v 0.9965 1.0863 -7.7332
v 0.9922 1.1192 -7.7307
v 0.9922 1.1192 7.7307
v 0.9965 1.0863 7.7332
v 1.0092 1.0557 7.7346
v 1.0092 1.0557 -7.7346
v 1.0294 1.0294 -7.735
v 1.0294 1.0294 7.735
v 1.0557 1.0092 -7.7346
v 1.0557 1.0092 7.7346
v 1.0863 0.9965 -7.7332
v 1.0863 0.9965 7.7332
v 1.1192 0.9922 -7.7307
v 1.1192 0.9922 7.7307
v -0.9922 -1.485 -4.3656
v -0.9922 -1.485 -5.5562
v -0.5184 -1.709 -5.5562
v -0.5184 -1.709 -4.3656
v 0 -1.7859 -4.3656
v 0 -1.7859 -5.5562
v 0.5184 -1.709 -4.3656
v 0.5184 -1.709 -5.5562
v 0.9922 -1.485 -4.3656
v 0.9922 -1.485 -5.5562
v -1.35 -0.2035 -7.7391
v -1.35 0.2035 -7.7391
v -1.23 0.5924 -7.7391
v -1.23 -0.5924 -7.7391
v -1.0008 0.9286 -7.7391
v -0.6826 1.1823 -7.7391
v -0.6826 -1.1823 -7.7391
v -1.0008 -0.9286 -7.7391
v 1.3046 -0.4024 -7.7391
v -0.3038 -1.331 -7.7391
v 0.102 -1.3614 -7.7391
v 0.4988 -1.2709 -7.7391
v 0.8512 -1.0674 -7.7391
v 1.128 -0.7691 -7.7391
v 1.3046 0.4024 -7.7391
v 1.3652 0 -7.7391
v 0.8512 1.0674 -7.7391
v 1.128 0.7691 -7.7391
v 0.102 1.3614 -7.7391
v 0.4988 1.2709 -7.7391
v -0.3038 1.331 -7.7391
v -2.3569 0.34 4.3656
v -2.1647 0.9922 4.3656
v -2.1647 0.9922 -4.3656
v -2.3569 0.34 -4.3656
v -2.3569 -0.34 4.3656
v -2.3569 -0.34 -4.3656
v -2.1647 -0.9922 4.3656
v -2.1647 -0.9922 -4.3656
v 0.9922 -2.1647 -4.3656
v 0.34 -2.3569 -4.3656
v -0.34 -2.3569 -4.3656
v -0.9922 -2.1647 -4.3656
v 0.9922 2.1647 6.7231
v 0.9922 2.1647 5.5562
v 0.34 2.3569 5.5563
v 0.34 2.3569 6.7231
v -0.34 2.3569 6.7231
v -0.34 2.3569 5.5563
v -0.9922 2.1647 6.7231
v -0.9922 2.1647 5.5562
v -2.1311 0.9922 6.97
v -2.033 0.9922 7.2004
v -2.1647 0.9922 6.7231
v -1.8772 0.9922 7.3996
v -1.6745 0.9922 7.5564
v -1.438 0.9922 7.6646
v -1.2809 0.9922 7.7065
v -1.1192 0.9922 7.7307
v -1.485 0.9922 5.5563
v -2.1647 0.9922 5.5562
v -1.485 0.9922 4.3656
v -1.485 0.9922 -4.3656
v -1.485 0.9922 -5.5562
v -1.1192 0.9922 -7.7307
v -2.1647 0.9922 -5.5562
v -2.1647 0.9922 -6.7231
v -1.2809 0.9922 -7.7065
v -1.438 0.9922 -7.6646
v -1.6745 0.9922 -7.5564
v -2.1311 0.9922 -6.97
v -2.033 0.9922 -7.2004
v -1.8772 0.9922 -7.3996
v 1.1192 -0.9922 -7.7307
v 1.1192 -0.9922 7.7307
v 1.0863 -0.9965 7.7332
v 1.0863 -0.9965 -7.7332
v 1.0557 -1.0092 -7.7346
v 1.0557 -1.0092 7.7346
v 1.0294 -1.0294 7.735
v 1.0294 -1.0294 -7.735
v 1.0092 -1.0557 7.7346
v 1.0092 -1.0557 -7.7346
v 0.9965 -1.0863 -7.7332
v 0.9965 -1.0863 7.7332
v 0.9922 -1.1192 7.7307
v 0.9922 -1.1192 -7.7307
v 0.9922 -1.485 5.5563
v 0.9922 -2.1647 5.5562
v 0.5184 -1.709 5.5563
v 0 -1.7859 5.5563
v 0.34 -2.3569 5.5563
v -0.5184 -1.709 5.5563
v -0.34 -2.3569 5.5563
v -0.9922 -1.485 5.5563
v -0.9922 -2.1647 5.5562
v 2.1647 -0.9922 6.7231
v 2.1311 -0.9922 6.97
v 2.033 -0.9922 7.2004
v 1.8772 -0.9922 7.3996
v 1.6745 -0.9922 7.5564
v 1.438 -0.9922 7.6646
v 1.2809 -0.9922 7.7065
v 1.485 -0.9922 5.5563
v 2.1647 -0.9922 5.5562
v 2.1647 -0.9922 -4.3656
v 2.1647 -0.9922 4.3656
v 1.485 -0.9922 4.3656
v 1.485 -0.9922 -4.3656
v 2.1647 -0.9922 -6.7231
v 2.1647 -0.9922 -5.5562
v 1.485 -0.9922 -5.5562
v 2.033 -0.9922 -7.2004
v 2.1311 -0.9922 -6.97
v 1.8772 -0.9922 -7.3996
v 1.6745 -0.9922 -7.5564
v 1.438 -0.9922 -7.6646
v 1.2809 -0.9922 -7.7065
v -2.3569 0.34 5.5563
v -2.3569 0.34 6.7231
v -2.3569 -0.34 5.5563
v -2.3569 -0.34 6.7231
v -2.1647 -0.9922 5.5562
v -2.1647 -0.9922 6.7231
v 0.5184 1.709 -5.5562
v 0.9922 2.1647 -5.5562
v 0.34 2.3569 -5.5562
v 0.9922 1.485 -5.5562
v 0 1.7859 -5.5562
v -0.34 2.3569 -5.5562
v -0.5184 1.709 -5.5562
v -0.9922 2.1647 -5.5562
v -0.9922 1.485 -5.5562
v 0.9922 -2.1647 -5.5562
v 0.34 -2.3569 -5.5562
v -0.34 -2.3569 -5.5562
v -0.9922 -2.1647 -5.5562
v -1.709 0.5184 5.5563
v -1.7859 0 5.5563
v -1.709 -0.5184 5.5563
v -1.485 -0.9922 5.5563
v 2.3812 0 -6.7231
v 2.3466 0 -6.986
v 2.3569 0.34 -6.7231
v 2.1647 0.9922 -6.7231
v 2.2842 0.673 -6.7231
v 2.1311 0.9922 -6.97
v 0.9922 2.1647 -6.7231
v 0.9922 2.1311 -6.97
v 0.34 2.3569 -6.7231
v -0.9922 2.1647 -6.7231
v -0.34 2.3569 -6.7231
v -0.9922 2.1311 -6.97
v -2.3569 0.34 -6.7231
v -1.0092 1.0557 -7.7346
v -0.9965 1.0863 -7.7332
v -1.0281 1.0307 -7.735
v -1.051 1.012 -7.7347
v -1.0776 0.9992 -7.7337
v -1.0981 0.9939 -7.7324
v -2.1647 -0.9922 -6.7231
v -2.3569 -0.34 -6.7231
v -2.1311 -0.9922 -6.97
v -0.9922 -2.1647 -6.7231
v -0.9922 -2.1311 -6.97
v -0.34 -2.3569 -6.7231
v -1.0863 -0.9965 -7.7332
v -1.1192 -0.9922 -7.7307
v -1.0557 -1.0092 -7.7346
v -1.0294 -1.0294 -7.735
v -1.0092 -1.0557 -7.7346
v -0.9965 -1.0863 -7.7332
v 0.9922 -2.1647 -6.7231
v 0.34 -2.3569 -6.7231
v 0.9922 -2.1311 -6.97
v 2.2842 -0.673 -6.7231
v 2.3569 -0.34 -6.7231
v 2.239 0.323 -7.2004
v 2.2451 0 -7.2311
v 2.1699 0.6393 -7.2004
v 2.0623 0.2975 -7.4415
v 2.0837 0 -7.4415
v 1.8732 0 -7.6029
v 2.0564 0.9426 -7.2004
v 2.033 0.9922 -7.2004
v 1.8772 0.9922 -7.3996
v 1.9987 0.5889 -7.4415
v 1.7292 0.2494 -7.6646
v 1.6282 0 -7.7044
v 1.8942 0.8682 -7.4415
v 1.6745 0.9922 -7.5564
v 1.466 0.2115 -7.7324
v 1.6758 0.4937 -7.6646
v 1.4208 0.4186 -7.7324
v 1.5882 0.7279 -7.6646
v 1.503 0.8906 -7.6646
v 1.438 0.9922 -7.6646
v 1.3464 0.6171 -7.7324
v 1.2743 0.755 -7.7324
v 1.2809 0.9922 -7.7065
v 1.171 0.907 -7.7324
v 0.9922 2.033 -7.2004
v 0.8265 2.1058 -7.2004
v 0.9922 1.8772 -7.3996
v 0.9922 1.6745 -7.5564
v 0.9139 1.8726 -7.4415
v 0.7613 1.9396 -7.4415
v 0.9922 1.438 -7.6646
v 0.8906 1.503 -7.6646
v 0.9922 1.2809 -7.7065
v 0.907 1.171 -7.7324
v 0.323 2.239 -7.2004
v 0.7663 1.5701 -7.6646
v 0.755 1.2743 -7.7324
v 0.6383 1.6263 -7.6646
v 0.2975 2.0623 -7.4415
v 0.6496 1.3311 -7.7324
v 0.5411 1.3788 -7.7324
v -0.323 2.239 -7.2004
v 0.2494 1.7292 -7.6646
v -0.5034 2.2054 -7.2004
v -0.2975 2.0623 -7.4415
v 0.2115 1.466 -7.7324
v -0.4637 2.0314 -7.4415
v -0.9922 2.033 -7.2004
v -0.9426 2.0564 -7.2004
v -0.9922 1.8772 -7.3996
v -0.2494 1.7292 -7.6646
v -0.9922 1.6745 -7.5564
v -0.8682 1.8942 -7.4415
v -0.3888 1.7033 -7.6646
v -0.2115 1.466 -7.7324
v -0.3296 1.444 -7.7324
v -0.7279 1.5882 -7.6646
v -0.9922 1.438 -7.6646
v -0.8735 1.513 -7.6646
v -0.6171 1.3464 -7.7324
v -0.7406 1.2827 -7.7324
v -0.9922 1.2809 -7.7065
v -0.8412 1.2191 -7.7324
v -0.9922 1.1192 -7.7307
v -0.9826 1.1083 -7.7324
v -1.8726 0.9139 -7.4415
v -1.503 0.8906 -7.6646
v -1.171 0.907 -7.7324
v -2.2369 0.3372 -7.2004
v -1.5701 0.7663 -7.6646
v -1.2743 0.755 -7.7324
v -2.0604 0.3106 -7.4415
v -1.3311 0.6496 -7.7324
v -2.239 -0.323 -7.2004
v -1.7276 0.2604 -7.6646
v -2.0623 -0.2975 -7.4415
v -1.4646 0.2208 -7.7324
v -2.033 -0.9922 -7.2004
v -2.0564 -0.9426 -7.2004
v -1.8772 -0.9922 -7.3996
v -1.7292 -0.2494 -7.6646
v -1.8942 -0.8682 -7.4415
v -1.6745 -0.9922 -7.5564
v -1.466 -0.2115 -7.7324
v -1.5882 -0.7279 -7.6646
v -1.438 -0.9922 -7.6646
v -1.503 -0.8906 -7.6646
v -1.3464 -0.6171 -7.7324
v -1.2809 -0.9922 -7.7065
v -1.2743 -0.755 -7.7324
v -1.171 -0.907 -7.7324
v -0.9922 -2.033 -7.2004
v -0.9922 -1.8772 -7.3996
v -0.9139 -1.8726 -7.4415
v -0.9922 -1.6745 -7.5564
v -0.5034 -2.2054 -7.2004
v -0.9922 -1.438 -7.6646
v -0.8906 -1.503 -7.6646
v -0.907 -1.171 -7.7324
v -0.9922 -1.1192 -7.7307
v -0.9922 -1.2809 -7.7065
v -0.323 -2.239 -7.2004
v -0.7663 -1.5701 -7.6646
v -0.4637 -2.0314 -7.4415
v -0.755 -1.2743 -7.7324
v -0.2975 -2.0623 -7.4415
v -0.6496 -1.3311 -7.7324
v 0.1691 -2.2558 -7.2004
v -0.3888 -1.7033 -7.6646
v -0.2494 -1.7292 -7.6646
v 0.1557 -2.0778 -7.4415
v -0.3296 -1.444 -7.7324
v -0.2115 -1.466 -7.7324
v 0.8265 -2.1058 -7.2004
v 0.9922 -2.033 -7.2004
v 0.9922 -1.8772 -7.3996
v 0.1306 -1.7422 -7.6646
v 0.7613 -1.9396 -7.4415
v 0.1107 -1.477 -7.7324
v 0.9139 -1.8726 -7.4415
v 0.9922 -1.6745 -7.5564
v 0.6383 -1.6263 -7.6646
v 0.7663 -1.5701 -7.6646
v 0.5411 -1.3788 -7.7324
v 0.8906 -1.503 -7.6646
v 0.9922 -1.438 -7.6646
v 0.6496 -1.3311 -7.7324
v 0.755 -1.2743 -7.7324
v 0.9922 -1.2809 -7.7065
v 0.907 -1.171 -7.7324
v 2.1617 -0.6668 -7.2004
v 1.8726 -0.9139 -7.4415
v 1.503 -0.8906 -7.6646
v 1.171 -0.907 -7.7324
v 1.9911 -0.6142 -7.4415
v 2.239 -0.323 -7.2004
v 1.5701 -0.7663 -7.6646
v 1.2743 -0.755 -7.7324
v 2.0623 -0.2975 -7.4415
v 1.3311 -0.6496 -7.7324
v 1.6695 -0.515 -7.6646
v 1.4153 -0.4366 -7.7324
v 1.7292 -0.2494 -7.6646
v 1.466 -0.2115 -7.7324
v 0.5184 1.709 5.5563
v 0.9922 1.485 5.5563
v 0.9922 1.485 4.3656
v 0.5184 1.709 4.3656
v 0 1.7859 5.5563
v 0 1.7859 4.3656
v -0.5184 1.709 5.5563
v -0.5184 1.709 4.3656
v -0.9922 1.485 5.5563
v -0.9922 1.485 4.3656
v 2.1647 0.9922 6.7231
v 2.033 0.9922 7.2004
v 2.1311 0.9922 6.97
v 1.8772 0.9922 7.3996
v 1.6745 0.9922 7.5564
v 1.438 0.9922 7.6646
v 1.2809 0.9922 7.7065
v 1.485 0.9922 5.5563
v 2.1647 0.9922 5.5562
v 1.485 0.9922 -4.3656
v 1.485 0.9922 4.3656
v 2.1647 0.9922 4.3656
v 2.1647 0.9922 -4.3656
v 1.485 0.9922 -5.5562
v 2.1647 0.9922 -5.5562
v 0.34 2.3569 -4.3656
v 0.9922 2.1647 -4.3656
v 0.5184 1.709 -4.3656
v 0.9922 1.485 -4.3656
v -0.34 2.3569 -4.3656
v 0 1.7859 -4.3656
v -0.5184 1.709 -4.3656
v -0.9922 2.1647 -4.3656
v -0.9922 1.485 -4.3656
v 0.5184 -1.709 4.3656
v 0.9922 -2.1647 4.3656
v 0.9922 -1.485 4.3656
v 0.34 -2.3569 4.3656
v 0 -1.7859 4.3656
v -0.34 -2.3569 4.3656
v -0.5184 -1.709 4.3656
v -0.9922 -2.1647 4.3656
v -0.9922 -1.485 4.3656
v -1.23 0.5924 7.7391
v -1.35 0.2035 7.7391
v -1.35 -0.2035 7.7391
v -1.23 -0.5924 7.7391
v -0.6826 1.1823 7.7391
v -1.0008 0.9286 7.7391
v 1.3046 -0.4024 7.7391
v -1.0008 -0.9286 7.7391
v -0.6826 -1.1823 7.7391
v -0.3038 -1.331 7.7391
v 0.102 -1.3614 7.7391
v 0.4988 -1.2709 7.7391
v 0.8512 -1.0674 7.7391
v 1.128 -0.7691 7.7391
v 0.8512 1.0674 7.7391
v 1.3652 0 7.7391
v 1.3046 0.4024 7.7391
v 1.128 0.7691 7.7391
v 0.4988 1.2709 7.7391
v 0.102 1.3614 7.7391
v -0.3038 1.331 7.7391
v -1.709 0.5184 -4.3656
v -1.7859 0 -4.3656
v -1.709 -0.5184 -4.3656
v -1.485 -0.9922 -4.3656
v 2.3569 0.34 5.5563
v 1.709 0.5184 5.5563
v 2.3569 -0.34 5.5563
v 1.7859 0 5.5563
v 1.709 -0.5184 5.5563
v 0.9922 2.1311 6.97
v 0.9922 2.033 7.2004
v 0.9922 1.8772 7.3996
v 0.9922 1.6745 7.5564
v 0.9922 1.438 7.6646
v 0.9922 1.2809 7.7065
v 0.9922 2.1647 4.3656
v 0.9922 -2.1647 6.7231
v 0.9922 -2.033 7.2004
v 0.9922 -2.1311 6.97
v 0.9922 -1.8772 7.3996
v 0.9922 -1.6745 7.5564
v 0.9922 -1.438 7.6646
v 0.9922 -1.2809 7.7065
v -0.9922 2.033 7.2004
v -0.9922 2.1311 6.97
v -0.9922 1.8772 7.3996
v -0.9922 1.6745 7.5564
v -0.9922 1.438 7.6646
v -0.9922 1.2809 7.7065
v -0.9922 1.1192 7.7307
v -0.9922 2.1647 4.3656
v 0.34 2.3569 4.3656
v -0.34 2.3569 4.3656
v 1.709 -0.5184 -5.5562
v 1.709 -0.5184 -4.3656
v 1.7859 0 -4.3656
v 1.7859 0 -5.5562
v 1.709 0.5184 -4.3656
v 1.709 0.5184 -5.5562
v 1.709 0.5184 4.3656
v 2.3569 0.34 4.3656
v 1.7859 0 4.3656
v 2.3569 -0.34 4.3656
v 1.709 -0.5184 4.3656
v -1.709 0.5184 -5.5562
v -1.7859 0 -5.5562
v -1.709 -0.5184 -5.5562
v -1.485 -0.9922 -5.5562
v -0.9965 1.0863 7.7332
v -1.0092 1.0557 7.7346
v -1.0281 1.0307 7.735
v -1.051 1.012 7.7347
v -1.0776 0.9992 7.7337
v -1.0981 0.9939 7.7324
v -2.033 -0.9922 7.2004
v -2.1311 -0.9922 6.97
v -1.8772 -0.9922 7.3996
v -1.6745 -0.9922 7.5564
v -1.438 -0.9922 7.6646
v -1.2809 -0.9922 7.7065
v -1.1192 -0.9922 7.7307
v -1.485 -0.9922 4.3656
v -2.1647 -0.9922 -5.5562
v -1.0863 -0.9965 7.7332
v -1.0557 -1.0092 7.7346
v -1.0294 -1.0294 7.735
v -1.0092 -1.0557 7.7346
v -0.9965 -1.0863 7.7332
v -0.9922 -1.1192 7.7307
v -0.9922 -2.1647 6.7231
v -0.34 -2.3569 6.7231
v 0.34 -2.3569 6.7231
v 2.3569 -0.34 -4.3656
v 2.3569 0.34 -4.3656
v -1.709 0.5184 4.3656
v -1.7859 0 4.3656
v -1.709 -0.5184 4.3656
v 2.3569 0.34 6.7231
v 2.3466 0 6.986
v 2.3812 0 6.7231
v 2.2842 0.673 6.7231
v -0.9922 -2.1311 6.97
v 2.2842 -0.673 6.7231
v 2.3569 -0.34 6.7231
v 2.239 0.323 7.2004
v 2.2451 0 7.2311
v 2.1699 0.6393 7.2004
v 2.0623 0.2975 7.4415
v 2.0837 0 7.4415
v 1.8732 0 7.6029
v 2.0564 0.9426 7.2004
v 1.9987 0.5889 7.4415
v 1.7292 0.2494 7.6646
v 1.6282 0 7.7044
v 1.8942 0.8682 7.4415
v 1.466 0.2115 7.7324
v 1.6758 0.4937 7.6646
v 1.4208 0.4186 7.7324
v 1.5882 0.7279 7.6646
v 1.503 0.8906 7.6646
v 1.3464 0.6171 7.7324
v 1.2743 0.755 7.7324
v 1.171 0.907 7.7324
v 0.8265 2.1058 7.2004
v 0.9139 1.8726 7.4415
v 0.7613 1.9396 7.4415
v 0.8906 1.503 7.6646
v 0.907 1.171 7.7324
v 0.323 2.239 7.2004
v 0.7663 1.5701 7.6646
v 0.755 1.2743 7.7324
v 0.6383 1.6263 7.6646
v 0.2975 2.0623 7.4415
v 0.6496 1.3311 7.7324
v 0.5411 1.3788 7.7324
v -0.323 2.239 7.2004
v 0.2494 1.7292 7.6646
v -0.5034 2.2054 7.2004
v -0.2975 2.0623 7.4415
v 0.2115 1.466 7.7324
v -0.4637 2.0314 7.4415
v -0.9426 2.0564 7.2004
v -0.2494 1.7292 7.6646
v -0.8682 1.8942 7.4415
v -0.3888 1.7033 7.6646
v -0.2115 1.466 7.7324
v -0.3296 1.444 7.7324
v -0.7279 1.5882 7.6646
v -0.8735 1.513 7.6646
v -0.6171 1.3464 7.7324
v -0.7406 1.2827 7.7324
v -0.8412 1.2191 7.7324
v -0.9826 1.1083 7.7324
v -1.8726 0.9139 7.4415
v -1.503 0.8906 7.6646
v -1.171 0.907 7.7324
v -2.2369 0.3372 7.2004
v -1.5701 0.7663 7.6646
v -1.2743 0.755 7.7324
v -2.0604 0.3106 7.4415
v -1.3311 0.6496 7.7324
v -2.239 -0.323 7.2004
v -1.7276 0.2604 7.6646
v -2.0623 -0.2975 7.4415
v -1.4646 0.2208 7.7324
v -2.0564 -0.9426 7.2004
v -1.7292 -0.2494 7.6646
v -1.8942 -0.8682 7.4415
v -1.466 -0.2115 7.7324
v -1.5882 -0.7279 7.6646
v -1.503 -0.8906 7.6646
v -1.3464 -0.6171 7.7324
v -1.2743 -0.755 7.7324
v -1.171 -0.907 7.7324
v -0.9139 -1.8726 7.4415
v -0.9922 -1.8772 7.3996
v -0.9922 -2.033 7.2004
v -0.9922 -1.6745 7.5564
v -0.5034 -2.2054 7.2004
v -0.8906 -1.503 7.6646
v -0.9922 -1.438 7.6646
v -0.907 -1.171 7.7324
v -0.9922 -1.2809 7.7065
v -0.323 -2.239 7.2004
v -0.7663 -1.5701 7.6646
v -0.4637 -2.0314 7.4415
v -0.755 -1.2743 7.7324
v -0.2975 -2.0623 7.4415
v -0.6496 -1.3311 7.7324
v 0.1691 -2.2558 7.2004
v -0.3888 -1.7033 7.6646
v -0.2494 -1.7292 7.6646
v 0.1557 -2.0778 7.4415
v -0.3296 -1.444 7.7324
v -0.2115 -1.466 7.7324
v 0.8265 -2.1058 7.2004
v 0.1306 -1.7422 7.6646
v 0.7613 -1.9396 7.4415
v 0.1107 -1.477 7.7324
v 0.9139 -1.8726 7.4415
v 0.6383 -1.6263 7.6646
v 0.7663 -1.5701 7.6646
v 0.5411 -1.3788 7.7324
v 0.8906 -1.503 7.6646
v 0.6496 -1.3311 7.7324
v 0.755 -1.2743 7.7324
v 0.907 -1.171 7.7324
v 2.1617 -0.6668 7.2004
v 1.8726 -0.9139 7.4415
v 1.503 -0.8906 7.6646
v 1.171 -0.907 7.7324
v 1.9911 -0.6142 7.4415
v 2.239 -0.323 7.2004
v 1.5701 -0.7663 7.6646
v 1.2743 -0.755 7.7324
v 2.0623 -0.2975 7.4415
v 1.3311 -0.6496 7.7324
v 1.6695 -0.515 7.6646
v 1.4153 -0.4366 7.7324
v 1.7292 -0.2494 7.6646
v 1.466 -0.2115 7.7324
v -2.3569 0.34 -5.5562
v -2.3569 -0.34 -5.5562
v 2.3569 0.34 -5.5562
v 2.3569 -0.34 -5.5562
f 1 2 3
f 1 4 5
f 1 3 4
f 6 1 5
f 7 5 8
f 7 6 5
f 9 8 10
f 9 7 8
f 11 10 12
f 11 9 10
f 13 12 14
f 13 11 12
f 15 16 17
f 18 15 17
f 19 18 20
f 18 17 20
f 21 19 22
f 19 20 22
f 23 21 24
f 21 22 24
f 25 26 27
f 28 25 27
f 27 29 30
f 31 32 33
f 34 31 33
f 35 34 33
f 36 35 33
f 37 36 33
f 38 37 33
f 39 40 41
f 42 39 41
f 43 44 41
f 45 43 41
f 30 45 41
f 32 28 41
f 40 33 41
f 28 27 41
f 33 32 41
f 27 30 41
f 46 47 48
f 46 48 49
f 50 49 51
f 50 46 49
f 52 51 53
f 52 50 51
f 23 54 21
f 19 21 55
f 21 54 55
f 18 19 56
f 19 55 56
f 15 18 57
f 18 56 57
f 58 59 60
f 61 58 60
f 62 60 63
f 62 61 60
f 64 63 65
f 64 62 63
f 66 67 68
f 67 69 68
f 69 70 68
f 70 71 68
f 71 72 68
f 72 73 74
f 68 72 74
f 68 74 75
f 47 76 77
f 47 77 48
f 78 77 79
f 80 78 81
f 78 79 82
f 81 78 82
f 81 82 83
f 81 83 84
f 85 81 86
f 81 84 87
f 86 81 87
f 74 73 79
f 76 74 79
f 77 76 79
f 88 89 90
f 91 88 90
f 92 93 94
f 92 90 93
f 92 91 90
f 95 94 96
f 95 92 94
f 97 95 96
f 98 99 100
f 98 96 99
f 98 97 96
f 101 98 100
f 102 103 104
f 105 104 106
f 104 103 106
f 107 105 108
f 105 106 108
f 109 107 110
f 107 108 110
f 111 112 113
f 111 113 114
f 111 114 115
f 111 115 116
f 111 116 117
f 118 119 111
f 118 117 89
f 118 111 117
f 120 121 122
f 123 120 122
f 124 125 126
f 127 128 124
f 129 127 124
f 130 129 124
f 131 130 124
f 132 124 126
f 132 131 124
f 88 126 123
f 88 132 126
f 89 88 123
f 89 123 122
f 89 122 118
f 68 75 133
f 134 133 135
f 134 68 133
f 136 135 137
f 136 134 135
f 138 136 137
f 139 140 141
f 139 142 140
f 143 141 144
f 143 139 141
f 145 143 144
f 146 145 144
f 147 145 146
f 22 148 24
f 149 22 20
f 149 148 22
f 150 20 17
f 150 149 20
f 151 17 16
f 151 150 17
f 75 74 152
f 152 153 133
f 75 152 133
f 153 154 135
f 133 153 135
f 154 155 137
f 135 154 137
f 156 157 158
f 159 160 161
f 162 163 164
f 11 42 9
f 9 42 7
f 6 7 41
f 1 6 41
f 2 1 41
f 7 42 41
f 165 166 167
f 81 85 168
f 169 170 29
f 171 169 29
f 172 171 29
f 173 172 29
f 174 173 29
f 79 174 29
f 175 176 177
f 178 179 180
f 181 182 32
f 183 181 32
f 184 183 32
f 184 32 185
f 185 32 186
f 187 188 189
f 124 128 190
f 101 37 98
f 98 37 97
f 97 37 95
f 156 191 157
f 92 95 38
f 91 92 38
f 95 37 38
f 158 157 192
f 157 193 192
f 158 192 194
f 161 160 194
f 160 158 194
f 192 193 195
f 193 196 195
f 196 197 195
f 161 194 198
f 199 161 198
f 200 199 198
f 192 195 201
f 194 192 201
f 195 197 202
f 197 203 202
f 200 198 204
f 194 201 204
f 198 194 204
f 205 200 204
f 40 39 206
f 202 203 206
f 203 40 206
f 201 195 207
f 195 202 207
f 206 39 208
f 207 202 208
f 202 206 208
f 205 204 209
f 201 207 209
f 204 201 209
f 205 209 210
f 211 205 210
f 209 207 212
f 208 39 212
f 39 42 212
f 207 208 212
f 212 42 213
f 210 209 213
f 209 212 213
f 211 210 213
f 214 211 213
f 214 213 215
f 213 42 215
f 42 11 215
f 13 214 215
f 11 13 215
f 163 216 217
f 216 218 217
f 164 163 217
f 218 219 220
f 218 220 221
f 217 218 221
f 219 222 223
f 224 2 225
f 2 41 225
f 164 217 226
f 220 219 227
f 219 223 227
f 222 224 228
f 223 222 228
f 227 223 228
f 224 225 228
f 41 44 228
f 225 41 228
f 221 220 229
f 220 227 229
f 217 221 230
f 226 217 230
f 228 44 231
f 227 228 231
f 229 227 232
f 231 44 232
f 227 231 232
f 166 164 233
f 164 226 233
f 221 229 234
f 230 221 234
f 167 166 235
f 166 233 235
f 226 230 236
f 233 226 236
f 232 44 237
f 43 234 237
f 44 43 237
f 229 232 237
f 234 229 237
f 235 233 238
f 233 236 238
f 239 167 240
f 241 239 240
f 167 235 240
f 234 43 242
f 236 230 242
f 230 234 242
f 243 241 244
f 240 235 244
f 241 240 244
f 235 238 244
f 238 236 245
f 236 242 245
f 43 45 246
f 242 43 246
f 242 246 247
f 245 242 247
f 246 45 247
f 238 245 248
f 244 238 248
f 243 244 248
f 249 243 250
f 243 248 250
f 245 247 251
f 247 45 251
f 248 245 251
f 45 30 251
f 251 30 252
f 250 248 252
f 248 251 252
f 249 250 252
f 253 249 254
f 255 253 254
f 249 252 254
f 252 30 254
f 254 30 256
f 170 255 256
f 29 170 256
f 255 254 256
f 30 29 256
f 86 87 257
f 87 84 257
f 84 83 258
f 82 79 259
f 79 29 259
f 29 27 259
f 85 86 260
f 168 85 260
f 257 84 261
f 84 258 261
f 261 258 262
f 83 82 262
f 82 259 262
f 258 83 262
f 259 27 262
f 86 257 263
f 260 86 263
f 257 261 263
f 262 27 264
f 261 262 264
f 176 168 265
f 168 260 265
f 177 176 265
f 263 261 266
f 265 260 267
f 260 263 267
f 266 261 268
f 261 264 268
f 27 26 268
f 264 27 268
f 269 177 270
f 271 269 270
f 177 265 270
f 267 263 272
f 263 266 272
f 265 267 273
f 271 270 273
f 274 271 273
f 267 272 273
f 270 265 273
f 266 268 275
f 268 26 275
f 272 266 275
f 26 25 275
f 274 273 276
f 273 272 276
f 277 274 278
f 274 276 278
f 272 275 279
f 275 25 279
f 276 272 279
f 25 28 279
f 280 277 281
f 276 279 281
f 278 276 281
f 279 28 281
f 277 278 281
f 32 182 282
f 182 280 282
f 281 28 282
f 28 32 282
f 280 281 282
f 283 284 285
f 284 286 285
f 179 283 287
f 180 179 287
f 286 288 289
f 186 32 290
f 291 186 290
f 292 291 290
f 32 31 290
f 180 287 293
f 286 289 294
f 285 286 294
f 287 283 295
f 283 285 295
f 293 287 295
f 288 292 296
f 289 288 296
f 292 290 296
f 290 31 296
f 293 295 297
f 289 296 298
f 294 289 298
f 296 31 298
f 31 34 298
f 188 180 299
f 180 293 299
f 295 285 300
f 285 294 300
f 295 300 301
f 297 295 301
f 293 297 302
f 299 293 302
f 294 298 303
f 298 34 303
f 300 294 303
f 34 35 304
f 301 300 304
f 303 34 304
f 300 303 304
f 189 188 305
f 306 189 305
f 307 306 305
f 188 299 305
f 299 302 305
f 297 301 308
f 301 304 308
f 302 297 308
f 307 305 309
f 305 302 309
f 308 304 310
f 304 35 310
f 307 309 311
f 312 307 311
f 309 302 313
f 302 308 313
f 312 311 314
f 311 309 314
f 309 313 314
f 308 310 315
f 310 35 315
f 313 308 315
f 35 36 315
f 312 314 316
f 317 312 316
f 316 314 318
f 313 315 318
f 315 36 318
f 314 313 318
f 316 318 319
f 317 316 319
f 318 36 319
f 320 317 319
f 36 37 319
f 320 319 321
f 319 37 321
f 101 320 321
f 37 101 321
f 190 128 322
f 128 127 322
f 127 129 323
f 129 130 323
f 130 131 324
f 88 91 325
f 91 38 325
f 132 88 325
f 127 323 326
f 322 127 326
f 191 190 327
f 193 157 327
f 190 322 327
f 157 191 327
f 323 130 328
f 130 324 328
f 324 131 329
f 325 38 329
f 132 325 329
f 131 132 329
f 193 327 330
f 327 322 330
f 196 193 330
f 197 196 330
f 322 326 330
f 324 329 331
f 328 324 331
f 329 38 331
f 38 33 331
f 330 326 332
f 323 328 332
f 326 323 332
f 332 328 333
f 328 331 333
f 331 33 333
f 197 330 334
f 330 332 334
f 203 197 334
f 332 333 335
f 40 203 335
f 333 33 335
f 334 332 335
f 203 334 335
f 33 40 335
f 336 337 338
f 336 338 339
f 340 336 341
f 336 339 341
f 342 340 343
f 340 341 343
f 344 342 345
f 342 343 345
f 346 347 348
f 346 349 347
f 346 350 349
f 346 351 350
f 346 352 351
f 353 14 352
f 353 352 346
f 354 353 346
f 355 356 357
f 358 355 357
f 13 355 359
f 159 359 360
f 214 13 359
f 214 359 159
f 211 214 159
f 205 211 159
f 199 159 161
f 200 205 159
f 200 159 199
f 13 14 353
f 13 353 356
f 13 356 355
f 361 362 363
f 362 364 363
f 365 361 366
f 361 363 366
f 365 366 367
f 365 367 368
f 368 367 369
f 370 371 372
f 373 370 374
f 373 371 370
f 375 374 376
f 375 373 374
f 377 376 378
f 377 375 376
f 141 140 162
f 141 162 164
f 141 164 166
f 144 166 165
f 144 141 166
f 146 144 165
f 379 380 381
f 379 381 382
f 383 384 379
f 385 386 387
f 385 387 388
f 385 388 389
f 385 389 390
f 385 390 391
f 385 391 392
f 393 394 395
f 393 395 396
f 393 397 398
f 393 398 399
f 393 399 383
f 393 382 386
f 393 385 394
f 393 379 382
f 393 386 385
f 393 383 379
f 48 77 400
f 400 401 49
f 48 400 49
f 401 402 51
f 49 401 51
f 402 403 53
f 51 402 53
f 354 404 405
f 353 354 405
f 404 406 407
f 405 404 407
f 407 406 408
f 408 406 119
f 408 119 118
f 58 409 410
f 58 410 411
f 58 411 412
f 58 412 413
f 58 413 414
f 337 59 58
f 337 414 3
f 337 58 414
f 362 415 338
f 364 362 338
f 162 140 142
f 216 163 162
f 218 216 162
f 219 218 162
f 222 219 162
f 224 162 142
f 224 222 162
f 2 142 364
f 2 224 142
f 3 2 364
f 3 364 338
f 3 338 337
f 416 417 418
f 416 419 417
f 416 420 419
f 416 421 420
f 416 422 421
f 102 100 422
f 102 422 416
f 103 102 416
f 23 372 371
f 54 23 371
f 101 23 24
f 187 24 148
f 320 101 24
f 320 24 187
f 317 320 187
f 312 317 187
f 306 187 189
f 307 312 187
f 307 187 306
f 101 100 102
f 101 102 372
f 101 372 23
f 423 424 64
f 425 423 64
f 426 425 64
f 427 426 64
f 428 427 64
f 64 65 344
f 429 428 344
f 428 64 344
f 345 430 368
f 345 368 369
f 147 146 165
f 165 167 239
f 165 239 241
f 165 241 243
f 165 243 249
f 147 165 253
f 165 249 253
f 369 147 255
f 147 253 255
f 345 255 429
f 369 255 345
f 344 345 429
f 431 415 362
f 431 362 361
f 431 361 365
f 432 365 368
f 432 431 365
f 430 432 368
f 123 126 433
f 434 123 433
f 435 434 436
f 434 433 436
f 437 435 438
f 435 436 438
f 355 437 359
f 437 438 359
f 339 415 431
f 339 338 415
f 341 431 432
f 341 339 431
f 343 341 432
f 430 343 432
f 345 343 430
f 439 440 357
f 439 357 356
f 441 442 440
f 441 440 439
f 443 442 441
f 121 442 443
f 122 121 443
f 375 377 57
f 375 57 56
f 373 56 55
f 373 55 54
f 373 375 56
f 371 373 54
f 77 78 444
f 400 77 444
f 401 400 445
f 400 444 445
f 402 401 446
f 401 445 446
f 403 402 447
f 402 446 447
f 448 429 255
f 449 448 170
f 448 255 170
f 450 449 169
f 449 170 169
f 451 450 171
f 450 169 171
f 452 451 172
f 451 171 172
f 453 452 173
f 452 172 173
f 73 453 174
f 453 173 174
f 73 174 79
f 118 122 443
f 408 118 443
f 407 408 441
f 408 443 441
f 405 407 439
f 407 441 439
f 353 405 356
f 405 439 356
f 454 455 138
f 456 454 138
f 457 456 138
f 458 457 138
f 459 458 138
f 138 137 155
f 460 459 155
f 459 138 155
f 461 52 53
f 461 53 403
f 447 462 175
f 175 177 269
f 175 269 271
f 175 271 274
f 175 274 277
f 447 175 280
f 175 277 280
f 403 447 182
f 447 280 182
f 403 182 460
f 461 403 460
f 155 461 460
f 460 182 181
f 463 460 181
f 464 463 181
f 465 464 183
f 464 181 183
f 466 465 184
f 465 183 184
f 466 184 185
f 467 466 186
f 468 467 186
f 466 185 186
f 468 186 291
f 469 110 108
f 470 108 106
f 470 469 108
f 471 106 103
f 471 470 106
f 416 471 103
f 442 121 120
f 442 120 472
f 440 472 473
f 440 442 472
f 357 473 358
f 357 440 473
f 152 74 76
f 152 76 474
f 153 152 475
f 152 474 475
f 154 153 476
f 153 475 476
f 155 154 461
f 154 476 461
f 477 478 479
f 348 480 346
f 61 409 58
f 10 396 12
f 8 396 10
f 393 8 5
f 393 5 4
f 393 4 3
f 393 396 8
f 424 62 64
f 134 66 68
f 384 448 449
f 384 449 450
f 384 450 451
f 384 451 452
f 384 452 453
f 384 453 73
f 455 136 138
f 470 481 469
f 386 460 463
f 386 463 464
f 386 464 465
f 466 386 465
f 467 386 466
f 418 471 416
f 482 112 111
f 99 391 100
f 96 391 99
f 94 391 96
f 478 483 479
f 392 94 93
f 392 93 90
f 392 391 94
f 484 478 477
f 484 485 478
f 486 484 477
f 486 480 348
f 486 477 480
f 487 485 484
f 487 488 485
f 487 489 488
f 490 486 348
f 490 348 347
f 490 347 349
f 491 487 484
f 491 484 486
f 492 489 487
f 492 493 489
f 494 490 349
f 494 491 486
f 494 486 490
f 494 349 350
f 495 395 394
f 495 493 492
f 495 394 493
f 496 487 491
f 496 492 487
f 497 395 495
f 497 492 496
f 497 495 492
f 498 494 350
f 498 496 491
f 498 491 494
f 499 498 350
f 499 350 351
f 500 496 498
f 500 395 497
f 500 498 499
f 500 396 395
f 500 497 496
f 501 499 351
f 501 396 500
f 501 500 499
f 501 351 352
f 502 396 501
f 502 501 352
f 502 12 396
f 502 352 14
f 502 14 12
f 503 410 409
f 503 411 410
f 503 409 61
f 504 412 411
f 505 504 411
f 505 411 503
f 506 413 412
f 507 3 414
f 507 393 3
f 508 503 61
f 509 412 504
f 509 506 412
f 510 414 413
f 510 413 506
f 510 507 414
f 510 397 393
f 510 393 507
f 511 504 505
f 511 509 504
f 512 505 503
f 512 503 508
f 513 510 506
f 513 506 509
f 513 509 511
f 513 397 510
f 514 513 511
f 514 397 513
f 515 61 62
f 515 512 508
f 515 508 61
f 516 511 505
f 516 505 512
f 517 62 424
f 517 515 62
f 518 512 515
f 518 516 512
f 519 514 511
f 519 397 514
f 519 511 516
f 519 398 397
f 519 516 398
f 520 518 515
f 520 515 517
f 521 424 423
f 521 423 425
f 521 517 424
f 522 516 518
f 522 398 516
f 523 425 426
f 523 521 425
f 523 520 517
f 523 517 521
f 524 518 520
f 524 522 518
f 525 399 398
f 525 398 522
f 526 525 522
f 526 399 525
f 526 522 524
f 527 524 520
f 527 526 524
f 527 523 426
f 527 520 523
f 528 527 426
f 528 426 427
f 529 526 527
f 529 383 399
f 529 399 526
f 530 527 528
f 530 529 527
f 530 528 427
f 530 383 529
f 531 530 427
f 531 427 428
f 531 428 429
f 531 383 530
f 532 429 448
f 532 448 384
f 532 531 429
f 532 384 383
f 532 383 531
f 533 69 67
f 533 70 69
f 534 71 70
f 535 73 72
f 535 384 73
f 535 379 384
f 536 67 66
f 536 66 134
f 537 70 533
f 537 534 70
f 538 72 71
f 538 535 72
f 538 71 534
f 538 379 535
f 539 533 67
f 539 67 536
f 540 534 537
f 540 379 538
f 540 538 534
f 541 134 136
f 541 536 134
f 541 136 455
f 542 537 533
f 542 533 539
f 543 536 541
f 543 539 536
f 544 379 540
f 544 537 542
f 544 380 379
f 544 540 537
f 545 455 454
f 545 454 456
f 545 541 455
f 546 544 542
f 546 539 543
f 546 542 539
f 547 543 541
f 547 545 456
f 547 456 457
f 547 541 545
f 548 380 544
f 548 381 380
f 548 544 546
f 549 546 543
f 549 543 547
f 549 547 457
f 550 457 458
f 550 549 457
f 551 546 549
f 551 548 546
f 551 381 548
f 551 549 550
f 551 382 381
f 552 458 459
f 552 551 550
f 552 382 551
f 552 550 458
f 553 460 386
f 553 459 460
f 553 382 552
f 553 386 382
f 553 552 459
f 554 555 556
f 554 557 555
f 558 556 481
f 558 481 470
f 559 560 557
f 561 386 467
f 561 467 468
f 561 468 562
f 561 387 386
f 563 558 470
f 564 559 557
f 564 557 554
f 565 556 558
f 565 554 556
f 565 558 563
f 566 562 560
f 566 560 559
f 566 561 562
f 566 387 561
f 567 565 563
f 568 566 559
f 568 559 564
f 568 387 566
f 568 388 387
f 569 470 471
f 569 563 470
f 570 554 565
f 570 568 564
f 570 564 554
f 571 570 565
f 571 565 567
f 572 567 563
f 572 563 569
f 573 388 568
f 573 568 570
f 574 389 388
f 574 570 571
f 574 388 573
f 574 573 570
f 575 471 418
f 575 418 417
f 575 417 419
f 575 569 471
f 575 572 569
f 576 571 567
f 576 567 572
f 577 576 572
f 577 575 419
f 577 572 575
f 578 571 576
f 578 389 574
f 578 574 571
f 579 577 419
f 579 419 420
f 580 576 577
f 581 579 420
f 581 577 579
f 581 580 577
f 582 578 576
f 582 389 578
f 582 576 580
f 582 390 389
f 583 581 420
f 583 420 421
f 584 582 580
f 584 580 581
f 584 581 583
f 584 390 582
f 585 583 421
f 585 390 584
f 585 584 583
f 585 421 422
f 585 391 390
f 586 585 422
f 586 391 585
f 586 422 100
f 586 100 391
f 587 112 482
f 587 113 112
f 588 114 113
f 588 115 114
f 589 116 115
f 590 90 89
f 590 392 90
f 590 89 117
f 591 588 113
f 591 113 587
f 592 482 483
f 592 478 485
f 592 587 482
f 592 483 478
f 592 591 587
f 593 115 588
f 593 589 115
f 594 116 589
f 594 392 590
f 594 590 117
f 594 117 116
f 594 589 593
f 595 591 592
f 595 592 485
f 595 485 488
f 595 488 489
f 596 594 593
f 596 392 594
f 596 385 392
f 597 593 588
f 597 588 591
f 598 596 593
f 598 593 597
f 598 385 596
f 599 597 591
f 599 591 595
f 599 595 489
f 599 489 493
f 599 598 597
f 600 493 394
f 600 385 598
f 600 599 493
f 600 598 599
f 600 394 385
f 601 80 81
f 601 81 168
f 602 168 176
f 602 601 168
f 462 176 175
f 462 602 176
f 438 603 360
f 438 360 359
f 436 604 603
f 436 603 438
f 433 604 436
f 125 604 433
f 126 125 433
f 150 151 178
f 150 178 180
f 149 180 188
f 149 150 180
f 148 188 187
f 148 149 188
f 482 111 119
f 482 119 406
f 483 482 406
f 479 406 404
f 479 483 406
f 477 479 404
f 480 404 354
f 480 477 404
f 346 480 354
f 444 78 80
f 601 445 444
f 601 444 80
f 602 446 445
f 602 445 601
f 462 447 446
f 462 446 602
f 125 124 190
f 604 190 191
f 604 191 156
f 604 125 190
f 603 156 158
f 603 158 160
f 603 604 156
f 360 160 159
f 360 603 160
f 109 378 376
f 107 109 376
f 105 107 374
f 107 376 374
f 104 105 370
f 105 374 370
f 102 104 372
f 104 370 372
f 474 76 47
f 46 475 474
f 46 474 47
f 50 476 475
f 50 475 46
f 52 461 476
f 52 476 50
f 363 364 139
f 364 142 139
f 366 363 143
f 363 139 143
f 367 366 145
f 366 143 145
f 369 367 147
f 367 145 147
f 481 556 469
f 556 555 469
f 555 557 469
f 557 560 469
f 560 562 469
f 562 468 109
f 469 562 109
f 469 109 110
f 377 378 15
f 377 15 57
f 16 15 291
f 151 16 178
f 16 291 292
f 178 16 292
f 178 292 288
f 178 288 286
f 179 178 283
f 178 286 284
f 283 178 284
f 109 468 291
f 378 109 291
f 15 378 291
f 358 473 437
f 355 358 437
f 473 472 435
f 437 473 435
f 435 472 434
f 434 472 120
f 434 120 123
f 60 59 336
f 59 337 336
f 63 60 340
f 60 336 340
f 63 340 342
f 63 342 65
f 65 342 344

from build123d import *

# Parameters (mm, degrees)
SKETCH1_R           = 2.38125
EXTRUDE1_DEPTH      = 7.7390625
FILLET1_R           = 1.016
EXTRUDE2_DEPTH      = 9.440011345
EXTRUDE2_DEPTH_BACK = 9.440011345
SKETCH4_W           = 0.5953125
SKETCH4_H           = 1.190625


with BuildPart() as part:
    # Sketch1 → Extrude1 (new, symmetric)
    with BuildSketch(Plane.XY):
        Circle(SKETCH1_R)
    extrude(amount=EXTRUDE1_DEPTH, both=True)

    # Fillet1
    fillet1_edges = [part.edges().sort_by_distance(p)[0] for p in [
        (-2.38125, 0, -7.7390625),
        (-2.38125, 0, 7.7390625),
    ]]
    fillet(fillet1_edges, radius=FILLET1_R)

    # Sketch3 → Extrude2 (cut, two sides: drawn at the far end of the back side and taken through both)
    with BuildSketch(Plane.XY.offset(-EXTRUDE2_DEPTH_BACK)):
        with BuildLine():
            Line((-0.9921875, 2.16469756), (-0.9921875, 1.1191875))
            ThreePointArc((-0.9921875, 1.1191875), (-1.029384939, 1.029384939), (-1.1191875, 0.9921875))
            Line((-1.1191875, 0.9921875), (-2.16469756, 0.9921875))
            ThreePointArc((-2.16469756, 0.9921875), (-1.683798023, 1.683798023), (-0.9921875, 2.16469756))
        make_face()
        with BuildLine():
            Line((-2.16469756, -0.9921875), (-1.1191875, -0.9921875))
            ThreePointArc((-1.1191875, -0.9921875), (-1.029384939, -1.029384939), (-0.9921875, -1.1191875))
            Line((-0.9921875, -1.1191875), (-0.9921875, -2.16469756))
            ThreePointArc((-0.9921875, -2.16469756), (-1.683798023, -1.683798023), (-2.16469756, -0.9921875))
        make_face()
        with BuildLine():
            Line((0.9921875, 2.16469756), (0.9921875, 1.1191875))
            ThreePointArc((0.9921875, 1.1191875), (1.029384939, 1.029384939), (1.1191875, 0.9921875))
            Line((1.1191875, 0.9921875), (2.16469756, 0.9921875))
            ThreePointArc((2.16469756, 0.9921875), (1.683798023, 1.683798023), (0.9921875, 2.16469756))
        make_face()
        with BuildLine():
            Line((0.9921875, -1.1191875), (0.9921875, -2.16469756))
            ThreePointArc((0.9921875, -2.16469756), (1.683798023, -1.683798023), (2.16469756, -0.9921875))
            Line((2.16469756, -0.9921875), (1.1191875, -0.9921875))
            ThreePointArc((1.1191875, -0.9921875), (1.029384939, -1.029384939), (0.9921875, -1.1191875))
        make_face()
    extrude(amount=EXTRUDE2_DEPTH + EXTRUDE2_DEPTH_BACK, mode=Mode.SUBTRACT)

    # Sketch4 → Cut-Revolve1 (revolve, cut)
    with BuildSketch(Plane(origin=(0, 0, 0), x_dir=(1, 0, 0), z_dir=(0, 1, 0))):
        with Locations((-2.08359375, 4.9609375)):
            Rectangle(SKETCH4_W, SKETCH4_H)
        with Locations((-2.08359375, -4.9609375)):
            Rectangle(SKETCH4_W, SKETCH4_H)
    revolve(axis=Axis((0, 0, -7.7390625), (0, 0, 1)), mode=Mode.SUBTRACT)


solid = part.part
